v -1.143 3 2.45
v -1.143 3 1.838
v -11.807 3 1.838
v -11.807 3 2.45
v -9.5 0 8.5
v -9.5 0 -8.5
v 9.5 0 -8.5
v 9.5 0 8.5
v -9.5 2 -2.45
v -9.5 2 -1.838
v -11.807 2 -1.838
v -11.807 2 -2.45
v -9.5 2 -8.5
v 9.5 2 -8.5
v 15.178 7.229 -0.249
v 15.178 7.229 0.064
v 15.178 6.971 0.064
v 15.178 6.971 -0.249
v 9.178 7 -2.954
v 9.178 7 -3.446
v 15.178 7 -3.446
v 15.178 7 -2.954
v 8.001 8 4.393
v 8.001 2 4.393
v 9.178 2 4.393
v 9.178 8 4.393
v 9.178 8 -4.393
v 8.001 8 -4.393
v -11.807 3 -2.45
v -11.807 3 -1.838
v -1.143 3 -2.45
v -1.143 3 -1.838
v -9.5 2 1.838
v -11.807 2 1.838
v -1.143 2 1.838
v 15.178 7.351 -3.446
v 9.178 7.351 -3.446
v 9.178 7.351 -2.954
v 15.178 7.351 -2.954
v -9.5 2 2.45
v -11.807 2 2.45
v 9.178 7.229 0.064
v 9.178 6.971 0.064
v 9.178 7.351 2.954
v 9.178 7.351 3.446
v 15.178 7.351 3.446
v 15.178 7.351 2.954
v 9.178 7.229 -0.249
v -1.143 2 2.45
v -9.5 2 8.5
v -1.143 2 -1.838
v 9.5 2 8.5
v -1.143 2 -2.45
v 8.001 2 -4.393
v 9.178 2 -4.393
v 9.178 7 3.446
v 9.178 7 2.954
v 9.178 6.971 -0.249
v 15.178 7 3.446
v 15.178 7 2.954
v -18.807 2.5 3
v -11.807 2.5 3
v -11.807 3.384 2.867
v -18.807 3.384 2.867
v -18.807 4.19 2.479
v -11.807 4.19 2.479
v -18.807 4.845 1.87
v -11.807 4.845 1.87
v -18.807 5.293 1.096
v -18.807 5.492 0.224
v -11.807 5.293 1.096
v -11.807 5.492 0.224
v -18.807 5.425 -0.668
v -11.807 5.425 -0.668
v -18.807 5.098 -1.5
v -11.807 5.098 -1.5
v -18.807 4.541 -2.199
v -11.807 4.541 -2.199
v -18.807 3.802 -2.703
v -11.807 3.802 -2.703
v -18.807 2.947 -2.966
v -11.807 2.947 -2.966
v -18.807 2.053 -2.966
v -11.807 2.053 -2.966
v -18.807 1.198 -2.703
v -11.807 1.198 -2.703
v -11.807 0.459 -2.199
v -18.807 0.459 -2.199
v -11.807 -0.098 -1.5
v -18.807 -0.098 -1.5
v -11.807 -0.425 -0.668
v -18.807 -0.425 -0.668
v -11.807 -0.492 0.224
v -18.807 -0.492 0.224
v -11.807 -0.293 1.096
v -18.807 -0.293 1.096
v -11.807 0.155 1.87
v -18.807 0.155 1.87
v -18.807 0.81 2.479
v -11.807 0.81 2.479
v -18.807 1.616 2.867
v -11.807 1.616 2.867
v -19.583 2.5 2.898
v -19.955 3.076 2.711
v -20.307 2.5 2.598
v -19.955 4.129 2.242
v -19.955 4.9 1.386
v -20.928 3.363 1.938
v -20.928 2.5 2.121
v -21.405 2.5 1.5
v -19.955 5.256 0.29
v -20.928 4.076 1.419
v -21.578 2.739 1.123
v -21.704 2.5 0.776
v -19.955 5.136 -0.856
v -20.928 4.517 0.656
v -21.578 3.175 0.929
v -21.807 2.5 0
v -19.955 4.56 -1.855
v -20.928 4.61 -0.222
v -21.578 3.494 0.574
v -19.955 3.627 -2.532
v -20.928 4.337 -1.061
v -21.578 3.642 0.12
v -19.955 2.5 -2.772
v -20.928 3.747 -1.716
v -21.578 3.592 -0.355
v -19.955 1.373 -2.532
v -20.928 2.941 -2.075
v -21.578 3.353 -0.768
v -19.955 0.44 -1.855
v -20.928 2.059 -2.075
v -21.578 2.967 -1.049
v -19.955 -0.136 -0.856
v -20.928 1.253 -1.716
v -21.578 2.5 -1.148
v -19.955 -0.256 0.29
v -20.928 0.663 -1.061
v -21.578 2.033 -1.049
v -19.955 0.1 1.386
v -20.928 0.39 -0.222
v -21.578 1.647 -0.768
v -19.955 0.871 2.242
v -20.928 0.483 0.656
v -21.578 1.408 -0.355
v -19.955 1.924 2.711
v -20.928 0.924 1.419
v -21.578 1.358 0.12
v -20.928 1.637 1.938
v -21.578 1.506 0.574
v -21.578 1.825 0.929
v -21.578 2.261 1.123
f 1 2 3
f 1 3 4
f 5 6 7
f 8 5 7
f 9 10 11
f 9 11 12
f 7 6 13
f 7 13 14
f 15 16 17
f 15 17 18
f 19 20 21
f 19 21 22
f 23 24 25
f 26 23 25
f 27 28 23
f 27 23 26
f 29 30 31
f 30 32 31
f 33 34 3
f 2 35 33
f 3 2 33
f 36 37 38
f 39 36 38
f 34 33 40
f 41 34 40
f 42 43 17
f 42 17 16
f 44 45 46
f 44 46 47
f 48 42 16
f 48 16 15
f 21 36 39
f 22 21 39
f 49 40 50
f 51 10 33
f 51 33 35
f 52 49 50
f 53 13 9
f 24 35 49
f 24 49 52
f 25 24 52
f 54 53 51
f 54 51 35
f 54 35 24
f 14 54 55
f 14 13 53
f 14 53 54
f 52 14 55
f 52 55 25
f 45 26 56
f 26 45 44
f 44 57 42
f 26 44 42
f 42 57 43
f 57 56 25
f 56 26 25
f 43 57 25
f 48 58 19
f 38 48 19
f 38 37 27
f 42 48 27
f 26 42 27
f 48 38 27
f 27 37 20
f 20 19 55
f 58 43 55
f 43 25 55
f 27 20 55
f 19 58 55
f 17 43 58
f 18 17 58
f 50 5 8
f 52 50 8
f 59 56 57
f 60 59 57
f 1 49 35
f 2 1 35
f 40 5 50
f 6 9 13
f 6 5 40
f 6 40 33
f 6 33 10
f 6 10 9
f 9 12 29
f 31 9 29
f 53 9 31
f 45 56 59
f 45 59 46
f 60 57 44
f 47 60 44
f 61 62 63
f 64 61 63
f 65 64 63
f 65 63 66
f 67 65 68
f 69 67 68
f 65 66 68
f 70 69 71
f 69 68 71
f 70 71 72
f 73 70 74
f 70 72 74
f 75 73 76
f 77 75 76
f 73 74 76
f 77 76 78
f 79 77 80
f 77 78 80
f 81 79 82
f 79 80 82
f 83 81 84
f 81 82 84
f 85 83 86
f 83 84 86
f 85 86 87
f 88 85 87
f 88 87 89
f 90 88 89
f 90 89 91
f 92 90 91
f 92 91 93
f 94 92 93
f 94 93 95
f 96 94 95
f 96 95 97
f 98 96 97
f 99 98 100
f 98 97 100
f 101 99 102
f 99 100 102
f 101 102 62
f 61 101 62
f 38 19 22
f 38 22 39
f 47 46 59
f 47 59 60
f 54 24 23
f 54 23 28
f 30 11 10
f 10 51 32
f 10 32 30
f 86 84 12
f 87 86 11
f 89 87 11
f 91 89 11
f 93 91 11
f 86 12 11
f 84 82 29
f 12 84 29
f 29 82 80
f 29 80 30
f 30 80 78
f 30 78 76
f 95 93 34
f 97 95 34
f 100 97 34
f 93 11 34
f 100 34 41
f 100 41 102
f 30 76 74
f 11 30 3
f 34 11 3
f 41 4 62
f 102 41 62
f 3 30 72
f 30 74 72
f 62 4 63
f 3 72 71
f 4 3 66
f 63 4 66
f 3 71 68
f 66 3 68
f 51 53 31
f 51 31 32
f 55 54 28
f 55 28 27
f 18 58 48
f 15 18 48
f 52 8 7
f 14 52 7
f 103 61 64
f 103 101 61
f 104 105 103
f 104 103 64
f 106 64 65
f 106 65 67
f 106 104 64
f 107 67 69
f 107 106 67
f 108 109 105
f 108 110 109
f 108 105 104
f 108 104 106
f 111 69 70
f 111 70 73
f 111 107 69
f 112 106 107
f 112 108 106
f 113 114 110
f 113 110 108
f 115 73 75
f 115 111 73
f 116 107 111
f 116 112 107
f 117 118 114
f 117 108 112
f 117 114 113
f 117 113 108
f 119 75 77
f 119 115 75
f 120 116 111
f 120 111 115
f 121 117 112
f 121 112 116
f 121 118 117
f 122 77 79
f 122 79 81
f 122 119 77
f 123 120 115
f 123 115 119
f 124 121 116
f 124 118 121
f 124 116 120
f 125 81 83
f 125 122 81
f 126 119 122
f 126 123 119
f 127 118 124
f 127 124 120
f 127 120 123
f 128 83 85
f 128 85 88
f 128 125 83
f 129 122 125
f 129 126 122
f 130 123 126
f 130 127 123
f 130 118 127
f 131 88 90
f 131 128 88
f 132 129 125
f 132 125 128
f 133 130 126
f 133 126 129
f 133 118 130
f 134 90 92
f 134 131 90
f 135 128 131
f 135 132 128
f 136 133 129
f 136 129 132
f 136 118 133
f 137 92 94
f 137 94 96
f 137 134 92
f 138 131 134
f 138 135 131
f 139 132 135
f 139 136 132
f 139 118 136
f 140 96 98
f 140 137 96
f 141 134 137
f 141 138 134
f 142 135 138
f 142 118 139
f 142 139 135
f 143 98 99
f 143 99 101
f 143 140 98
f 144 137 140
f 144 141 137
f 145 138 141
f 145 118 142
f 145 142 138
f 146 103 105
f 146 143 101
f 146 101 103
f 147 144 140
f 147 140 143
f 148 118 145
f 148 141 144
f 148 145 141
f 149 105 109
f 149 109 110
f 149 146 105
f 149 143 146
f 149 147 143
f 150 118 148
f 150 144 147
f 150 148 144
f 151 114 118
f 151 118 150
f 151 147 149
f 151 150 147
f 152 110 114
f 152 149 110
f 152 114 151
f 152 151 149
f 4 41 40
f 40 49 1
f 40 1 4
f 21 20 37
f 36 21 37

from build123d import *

# Parameters (mm, degrees)
ESQUISSE1_W        = 19
ESQUISSE1_H        = 17
BOSS_EXTRU_1_DEPTH = 2
ESQUISSE2_W        = 1.17663859
ESQUISSE2_H        = 8.785143252
BOSS_EXTRU_2_DEPTH = 6
ESQUISSE3_W        = 0.492340061
ESQUISSE3_H        = 0.351671472
BOSS_EXTRU_3_DEPTH = 6
ESQUISSE4_W        = 0.313154041
ESQUISSE4_H        = 0.257723979
BOSS_EXTRU_4_DEPTH = 6
ESQUISSE5_W        = 0.663647826
ESQUISSE5_H        = 0.612597993
BOSS_EXTRU_5_DEPTH = 1
ESQUISSE6_W        = 0.612597993
ESQUISSE6_H        = 1
BOSS_EXTRU_6_DEPTH = 10
ESQUISSE7_R        = 3
BOSS_EXTRU_7_DEPTH = 10
CONG_2_R           = 3


with BuildPart() as part:
    # Esquisse1 → Boss.-Extru.1 (new body)
    with BuildSketch(Plane(origin=(0, 0, 0), x_dir=(1, 0, 0), z_dir=(0, 1, 0))):
        Rectangle(ESQUISSE1_W, ESQUISSE1_H)
    extrude(amount=BOSS_EXTRU_1_DEPTH)

    # Esquisse2 → Boss.-Extru.2 (add)
    with BuildSketch(Plane(origin=(0, 2, 0), x_dir=(1, 0, 0), z_dir=(0, 1, 0))):
        with Locations((8.589461706, 0)):
            Rectangle(ESQUISSE2_W, ESQUISSE2_H)
    extrude(amount=BOSS_EXTRU_2_DEPTH)

    # Esquisse3 → Boss.-Extru.3 (add)
    with BuildSketch(Plane(origin=(9.177781001, 0, 0), x_dir=(0, 0, -1), z_dir=(1, 0, 0))):
        with Locations((-3.200210394, 7.175487816)):
            Rectangle(ESQUISSE3_W, ESQUISSE3_H)
    boss_extru_3 = extrude(amount=BOSS_EXTRU_3_DEPTH)

    # Symétrie1: Boss.-Extru.3 across plane
    add(boss_extru_3.mirror(Plane.XY))

    # Esquisse4 → Boss.-Extru.4 (add)
    with BuildSketch(Plane(origin=(9.177781001, 0, 0), x_dir=(0, 0, -1), z_dir=(1, 0, 0))):
        with Locations((0.092212431, 7.099938204)):
            Rectangle(ESQUISSE4_W, ESQUISSE4_H)
    extrude(amount=BOSS_EXTRU_4_DEPTH)

    # Esquisse5 → Boss.-Extru.5 (add)
    with BuildSketch(Plane(origin=(0, 2, 0), x_dir=(1, 0, 0), z_dir=(0, 1, 0))):
        with Locations((-1.474820367, -2.144092976)):
            Rectangle(ESQUISSE5_W, ESQUISSE5_H)
    boss_extru_5 = extrude(amount=BOSS_EXTRU_5_DEPTH)

    # Esquisse6 → Boss.-Extru.6 (add)
    with BuildSketch(Plane.ZY.offset(1.80664428)):
        with Locations((2.144092976, 2.5)):
            Rectangle(ESQUISSE6_W, ESQUISSE6_H)
    boss_extru_6 = extrude(amount=BOSS_EXTRU_6_DEPTH)

    # Symétrie2: Boss.-Extru.5, Boss.-Extru.6 across plane
    add(boss_extru_5.mirror(Plane.XY))
    add(boss_extru_6.mirror(Plane.XY))

    # Esquisse7 → Boss.-Extru.7 (add)
    with BuildSketch(Plane.ZY.offset(11.80664428)):
        with Locations((0, 2.5)):
            Circle(ESQUISSE7_R)
    extrude(amount=BOSS_EXTRU_7_DEPTH)

    # Congé2
    cong_2_edges = [part.edges().sort_by_distance(p)[0] for p in [
        (-21.80664428, 2.5, -3),
    ]]
    fillet(cong_2_edges, radius=CONG_2_R)


solid = part.part
